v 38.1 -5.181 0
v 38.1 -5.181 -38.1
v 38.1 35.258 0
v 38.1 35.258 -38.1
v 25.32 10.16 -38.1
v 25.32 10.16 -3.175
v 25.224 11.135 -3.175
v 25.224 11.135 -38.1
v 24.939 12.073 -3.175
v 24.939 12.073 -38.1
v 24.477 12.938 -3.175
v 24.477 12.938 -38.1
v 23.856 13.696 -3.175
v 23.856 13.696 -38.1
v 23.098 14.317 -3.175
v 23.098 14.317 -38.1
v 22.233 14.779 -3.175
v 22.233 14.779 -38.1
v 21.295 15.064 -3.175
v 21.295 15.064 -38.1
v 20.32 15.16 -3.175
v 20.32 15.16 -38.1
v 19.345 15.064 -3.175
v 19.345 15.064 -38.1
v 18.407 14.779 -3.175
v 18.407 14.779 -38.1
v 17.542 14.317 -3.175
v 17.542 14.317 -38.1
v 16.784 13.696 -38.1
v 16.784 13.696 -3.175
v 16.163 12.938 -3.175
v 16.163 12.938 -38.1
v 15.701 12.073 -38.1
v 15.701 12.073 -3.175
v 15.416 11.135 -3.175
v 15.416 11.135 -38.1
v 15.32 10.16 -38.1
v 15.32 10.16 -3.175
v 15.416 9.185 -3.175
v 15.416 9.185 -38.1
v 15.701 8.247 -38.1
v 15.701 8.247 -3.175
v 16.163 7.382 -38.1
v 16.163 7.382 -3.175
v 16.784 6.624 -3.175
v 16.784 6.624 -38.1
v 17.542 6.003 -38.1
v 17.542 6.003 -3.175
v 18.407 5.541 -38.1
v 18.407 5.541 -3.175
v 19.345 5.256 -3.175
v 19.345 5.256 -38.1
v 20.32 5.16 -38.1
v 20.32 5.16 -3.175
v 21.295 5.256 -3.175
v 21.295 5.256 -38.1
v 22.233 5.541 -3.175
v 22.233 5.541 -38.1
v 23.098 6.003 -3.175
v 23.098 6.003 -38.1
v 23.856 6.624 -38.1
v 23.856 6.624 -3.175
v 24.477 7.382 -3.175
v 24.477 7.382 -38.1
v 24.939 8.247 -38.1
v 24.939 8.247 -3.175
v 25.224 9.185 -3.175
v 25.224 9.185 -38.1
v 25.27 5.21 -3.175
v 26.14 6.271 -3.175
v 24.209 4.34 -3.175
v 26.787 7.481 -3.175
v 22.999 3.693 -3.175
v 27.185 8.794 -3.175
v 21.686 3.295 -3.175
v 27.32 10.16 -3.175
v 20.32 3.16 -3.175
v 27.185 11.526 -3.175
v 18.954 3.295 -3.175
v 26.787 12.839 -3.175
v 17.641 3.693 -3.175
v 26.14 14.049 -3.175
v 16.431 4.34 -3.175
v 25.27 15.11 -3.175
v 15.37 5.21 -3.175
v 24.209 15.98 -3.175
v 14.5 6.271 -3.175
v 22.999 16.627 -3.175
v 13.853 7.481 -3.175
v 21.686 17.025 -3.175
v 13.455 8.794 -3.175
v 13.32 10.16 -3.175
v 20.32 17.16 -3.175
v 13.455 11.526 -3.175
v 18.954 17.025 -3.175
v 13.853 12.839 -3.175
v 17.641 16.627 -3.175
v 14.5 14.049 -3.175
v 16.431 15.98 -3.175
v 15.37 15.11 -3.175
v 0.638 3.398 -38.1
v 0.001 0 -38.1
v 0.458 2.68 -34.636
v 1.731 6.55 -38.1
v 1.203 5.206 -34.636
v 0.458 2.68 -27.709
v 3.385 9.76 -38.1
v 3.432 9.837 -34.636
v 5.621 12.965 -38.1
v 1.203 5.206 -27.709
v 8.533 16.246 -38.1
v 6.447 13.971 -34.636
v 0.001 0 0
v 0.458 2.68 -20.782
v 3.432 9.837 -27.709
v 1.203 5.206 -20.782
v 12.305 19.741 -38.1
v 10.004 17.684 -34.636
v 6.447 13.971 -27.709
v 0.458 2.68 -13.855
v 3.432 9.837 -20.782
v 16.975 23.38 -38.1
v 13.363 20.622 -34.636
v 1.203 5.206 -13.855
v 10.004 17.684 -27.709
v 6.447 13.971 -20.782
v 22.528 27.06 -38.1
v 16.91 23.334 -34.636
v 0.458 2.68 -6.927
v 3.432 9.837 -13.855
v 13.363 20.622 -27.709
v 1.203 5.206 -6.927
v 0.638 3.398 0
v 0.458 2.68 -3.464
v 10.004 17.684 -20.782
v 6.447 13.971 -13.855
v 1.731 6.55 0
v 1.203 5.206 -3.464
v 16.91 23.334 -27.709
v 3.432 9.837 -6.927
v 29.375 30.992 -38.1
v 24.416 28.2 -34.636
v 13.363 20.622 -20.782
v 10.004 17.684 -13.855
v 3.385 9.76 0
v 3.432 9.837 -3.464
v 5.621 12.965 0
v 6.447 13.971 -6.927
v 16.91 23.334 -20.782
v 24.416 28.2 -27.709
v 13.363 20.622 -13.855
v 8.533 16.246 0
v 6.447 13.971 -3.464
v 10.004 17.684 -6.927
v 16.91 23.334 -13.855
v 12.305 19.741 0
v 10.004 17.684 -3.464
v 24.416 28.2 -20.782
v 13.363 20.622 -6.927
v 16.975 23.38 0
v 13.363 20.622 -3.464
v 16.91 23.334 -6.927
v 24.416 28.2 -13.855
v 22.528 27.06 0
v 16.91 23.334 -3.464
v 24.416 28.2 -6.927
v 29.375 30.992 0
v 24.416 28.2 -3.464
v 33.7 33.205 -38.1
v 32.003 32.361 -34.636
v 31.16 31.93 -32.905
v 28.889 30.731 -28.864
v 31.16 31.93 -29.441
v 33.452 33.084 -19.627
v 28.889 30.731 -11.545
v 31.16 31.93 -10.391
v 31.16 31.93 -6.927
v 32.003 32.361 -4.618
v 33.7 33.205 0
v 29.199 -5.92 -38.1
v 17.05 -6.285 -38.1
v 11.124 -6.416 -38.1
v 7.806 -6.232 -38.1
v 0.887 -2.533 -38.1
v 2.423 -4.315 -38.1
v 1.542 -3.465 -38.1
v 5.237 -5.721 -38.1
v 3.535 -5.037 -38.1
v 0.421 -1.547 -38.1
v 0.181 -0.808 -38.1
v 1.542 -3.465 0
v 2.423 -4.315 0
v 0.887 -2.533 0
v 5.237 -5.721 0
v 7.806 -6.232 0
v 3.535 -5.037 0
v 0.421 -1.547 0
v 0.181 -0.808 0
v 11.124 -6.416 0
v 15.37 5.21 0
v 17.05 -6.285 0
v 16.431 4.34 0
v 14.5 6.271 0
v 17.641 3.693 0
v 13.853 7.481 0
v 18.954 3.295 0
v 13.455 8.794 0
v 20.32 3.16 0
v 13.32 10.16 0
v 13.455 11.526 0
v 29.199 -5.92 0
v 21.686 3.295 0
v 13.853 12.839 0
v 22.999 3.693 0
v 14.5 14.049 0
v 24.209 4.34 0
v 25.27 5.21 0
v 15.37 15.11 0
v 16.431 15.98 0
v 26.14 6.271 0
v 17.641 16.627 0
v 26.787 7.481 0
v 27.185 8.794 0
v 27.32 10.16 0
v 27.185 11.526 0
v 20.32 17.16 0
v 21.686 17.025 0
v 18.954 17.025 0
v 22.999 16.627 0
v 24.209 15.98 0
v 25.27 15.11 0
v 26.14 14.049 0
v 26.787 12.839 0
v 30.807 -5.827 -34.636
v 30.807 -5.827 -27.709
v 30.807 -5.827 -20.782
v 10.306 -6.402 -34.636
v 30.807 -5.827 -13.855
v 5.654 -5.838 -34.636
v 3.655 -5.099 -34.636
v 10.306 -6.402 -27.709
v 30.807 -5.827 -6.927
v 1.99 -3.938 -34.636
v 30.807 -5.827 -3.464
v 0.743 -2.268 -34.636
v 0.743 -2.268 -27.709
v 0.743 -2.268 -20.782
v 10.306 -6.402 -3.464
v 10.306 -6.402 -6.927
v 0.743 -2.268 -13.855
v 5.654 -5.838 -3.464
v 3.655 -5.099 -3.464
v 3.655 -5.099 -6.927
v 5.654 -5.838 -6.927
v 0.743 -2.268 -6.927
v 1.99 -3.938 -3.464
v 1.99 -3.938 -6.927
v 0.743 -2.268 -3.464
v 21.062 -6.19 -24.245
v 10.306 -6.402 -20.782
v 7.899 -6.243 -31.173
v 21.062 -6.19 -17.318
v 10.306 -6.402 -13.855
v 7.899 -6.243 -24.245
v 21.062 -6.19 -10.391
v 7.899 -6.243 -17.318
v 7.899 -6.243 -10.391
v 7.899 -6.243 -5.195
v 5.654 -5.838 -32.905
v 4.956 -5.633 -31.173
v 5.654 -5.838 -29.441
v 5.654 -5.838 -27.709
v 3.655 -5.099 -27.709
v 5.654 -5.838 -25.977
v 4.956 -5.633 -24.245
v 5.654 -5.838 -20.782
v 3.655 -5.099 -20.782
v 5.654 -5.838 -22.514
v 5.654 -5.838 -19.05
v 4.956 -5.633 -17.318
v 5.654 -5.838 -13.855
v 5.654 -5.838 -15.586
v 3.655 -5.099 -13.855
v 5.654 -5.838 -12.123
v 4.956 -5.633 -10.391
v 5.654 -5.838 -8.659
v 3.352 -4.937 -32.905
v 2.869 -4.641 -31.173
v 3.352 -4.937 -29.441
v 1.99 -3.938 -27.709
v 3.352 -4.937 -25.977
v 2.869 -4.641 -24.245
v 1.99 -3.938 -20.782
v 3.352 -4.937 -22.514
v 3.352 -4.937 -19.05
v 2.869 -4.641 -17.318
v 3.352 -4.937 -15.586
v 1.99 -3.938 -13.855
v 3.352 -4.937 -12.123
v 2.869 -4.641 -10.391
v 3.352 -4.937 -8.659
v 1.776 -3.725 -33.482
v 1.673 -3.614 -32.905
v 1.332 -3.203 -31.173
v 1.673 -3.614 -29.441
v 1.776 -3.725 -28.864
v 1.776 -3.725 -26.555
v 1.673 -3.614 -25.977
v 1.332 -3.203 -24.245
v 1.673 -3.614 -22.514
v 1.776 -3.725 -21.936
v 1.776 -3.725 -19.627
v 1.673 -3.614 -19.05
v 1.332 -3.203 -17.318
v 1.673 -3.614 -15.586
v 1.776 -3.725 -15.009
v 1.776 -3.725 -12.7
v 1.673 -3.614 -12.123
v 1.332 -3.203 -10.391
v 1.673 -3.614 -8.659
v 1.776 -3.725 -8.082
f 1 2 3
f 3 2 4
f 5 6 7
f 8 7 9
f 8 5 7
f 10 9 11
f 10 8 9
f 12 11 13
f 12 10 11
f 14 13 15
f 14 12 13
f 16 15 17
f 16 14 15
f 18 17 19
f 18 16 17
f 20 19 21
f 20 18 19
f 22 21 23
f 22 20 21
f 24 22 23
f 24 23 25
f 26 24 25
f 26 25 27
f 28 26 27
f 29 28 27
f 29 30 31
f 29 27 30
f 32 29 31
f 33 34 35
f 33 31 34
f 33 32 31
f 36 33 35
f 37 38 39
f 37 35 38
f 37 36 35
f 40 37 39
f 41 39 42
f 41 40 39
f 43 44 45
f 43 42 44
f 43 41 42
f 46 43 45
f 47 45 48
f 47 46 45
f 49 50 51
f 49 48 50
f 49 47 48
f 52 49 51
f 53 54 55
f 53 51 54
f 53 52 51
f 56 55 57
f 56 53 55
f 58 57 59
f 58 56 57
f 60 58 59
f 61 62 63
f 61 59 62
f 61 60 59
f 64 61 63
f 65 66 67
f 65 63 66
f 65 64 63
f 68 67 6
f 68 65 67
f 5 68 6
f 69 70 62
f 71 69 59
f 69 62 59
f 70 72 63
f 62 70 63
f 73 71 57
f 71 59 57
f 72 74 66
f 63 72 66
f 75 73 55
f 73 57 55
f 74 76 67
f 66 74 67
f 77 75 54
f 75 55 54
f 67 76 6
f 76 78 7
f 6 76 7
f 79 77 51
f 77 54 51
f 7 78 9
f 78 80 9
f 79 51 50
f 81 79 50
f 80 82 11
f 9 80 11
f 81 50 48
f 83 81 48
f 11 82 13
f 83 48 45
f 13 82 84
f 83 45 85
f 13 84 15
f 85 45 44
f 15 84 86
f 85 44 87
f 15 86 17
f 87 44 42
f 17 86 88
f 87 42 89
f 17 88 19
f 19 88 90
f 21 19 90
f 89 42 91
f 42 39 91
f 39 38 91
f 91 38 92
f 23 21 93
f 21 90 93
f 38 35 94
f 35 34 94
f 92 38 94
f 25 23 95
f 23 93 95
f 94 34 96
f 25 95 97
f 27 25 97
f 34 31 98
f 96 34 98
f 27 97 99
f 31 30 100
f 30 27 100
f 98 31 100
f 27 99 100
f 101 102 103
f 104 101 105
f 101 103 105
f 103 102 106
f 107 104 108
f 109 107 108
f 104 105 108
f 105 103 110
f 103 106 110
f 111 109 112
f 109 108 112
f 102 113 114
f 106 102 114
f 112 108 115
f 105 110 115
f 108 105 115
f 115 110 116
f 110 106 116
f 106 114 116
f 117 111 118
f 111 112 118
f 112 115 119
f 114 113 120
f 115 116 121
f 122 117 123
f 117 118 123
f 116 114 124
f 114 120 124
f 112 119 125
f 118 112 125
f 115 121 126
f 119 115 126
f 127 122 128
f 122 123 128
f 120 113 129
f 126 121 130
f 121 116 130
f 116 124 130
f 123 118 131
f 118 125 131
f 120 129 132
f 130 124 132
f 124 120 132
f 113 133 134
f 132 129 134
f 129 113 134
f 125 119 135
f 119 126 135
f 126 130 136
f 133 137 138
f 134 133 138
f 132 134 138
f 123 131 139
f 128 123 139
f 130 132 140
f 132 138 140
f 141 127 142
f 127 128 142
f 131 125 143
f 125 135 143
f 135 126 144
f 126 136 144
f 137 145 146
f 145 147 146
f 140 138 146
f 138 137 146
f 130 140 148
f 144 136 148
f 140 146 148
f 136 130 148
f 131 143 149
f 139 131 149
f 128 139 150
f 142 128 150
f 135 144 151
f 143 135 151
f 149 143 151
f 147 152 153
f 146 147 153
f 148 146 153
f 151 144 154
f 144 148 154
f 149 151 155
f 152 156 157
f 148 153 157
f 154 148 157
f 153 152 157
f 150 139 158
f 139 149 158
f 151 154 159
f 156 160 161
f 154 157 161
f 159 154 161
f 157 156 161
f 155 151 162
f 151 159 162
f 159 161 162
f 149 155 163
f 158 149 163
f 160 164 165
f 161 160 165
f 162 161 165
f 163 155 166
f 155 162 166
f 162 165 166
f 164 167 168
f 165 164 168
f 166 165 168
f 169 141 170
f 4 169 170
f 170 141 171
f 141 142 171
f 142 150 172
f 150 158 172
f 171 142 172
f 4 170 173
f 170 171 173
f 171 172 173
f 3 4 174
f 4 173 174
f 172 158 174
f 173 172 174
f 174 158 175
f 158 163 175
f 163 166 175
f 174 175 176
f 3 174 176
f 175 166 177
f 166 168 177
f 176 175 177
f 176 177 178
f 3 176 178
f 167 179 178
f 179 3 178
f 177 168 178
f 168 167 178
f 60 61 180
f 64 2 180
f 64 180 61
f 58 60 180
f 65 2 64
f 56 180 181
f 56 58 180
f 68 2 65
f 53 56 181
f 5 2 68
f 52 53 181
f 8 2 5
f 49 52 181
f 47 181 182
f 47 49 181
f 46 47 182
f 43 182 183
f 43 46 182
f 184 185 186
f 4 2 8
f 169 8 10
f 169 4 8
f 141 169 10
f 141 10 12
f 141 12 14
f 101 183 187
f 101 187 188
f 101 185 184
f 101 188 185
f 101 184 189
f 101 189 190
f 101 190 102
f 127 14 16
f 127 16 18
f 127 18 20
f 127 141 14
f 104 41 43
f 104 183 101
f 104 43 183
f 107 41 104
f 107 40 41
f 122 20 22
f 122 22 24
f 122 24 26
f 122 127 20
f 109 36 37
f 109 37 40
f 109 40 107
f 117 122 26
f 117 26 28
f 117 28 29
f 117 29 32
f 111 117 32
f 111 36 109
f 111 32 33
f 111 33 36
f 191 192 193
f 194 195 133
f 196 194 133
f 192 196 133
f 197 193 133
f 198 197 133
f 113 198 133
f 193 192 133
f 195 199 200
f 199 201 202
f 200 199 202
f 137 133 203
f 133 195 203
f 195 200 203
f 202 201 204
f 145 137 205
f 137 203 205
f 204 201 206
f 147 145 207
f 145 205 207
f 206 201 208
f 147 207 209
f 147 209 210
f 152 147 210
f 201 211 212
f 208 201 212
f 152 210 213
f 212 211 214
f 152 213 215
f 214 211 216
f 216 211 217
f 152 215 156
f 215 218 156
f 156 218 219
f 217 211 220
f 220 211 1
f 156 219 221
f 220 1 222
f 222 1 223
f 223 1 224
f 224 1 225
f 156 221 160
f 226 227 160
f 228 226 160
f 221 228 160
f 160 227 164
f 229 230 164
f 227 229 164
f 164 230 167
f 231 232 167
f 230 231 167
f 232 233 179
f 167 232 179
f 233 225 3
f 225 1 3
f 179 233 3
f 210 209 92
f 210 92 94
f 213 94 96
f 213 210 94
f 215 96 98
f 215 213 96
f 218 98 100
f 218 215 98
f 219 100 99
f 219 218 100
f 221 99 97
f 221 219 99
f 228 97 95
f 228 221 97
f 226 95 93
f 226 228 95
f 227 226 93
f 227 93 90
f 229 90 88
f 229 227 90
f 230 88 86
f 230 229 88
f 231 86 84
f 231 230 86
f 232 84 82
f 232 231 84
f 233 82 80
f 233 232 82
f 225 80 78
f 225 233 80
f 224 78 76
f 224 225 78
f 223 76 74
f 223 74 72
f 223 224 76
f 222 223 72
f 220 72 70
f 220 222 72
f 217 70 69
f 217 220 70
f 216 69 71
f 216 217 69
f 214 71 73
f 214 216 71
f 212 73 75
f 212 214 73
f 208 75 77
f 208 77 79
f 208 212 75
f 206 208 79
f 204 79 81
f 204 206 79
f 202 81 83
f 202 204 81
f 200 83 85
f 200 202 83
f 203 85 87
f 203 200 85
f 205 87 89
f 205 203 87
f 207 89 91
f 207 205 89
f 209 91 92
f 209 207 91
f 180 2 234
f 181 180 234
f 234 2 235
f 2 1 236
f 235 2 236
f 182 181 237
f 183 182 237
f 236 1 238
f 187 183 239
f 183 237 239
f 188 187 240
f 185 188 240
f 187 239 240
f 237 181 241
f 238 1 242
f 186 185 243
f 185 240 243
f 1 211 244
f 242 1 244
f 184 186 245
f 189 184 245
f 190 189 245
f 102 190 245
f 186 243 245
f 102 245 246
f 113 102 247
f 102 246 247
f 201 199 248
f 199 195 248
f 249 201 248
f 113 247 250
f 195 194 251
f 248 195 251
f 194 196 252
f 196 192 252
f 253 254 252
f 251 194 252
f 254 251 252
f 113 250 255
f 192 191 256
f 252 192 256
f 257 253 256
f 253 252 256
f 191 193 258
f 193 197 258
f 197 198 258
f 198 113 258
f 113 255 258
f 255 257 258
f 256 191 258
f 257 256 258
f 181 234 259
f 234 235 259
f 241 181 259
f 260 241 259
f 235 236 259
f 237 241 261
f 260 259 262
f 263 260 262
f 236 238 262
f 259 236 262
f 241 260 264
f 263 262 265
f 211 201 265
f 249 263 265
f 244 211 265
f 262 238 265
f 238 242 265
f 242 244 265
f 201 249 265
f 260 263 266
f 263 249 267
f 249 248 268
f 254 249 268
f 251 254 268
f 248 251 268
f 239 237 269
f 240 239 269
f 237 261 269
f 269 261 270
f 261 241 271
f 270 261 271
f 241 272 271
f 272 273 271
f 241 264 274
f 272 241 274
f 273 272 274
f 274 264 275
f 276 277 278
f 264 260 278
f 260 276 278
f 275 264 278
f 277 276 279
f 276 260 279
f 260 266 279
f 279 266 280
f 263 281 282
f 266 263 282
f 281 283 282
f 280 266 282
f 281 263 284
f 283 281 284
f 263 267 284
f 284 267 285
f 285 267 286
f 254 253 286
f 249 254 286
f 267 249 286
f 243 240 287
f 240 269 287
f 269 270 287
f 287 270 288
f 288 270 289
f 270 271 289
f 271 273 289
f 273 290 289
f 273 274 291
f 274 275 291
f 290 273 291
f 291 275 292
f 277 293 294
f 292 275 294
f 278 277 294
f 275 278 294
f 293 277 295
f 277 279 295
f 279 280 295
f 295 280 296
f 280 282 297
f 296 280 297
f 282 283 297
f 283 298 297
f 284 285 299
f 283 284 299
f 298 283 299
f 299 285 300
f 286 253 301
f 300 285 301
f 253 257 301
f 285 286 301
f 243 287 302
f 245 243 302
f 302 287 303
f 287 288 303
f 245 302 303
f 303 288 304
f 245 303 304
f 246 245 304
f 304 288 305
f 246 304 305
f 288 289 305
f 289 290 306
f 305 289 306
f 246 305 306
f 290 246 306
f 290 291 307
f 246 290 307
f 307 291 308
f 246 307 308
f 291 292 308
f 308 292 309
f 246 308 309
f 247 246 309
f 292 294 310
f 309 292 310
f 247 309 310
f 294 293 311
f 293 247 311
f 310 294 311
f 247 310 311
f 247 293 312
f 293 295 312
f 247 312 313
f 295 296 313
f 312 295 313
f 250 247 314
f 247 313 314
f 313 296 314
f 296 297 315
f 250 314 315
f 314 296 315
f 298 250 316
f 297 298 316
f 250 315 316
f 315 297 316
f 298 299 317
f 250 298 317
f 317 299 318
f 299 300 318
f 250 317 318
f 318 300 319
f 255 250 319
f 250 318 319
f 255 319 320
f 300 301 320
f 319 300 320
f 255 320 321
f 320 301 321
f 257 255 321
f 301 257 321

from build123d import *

# Parameters (mm, degrees)
BOSS_EXTRUDE1_DEPTH = 38.1
SKETCH2_R           = 5
SKETCH2_R_2         = 3.175
CUT_EXTRUDE1_DEPTH  = 319.018514003
SKETCH3_W           = 293.188888759
SKETCH3_H           = 137.971241769
CUT_EXTRUDE2_DEPTH  = 319.018514003
SKETCH4_R           = 7
CUT_EXTRUDE3_DEPTH  = 3.175
SKETCH5_W           = 61.216236185
SKETCH5_H           = 51.695253477
CUT_EXTRUDE4_DEPTH  = 65.391872686


with BuildPart() as part:
    # Sketch1 → Boss-Extrude1 (new body)
    with BuildSketch(Plane.XY):
        with BuildLine():
            add(Edge.make_bspline(
                [(0.000560351, 0.000130087), (0.810633127, 7.359196055), (8.649092025, 17.856605174), (26.286719818, 29.975176328), (52.111128271, 42.069215275), (89.597618475, 49.290763054), (131.400792109, 47.884831915), (173.256699242, 40.041104278), (217.961060472, 29.612974894), (256.952064401, 19.528920948), (290.35983767, 8.71099439), (301.273197721, 4.382828139), (314.816918223, -0.516206742), (309.846313895, 0.000130087)],
                knots=[0, 0, 0, 0, 0.060863618, 0.113688265, 0.188608742, 0.312908923, 0.448482434, 0.557612135, 0.691544113, 0.852438279, 0.92975597, 0.976058229, 1, 1, 1, 1], degree=3))
            add(Edge.make_bspline(
                [(309.846313895, 0.000130087), (303.956832565, 1.47095521), (293.989507544, 2.093987313), (276.26402299, 4.514356704), (260.846344817, 5.427413394), (235.858814759, 7.870306192), (205.101424636, 8.838080282), (157.718638092, 9.030650149), (110.497331172, 6.181495223), (66.506197185, -0.586669107), (36.454672816, -6.098499901), (15.316603331, -6.189065841), (1.230714189, -6.924076091), (0.000560351, 0.000130087)],
                knots=[0, 0, 0, 0, 0.057787081, 0.095274891, 0.171021118, 0.205339302, 0.335319146, 0.464904334, 0.658702312, 0.785511947, 0.893517288, 0.94309214, 1, 1, 1, 1], degree=3))
        make_face()
    boss_extrude1 = extrude(amount=BOSS_EXTRUDE1_DEPTH)

    # Sketch2 → Cut-Extrude1 (cut, through all)
    with BuildSketch(Plane.XY.offset(38.1)):
        with Locations((20.32, 10.16)):
            Circle(SKETCH2_R)
        with Locations((227.296313895, 19.050130087)):
            Circle(SKETCH2_R_2)
    cut_extrude1 = extrude(amount=-CUT_EXTRUDE1_DEPTH, mode=Mode.SUBTRACT)

    # Sketch3 → Cut-Extrude2 (cut, through all)
    with BuildSketch(Plane.XY.offset(38.1)):
        with Locations((184.69444438, 2.732377951)):
            Rectangle(SKETCH3_W, SKETCH3_H)
    cut_extrude2 = extrude(amount=-CUT_EXTRUDE2_DEPTH, mode=Mode.SUBTRACT)

    # Sketch4 → Cut-Extrude3 (cut)
    with BuildSketch(Plane(origin=(0, 0, 0), x_dir=(-1, 0, 0), z_dir=(0, 0, -1))):
        with Locations((-20.32, 10.16)):
            Circle(SKETCH4_R)
    cut_extrude3 = extrude(amount=-CUT_EXTRUDE3_DEPTH, mode=Mode.SUBTRACT)

    # Mirror1: Boss-Extrude1, Cut-Extrude1, Cut-Extrude2, Cut-Extrude3 across plane
    add(boss_extrude1.mirror(Plane(origin=(153.387816973, 8.333381989, 0), x_dir=(1, 0, 0), z_dir=(0, 0, -1))))
    add(cut_extrude1.mirror(Plane(origin=(153.387816973, 8.333381989, 0), x_dir=(1, 0, 0), z_dir=(0, 0, -1))), mode=Mode.SUBTRACT)
    add(cut_extrude2.mirror(Plane(origin=(153.387816973, 8.333381989, 0), x_dir=(1, 0, 0), z_dir=(0, 0, -1))), mode=Mode.SUBTRACT)
    add(cut_extrude3.mirror(Plane(origin=(153.387816973, 8.333381989, 0), x_dir=(1, 0, 0), z_dir=(0, 0, -1))), mode=Mode.SUBTRACT)

    # Sketch5 → Cut-Extrude4 (cut, through all)
    with BuildSketch(Plane(origin=(38.1, 0, 0), x_dir=(0, 0, -1), z_dir=(1, 0, 0))):
        with Locations((-30.608118093, 9.410506282)):
            Rectangle(SKETCH5_W, SKETCH5_H)
    extrude(amount=-CUT_EXTRUDE4_DEPTH, mode=Mode.SUBTRACT)


solid = part.part
